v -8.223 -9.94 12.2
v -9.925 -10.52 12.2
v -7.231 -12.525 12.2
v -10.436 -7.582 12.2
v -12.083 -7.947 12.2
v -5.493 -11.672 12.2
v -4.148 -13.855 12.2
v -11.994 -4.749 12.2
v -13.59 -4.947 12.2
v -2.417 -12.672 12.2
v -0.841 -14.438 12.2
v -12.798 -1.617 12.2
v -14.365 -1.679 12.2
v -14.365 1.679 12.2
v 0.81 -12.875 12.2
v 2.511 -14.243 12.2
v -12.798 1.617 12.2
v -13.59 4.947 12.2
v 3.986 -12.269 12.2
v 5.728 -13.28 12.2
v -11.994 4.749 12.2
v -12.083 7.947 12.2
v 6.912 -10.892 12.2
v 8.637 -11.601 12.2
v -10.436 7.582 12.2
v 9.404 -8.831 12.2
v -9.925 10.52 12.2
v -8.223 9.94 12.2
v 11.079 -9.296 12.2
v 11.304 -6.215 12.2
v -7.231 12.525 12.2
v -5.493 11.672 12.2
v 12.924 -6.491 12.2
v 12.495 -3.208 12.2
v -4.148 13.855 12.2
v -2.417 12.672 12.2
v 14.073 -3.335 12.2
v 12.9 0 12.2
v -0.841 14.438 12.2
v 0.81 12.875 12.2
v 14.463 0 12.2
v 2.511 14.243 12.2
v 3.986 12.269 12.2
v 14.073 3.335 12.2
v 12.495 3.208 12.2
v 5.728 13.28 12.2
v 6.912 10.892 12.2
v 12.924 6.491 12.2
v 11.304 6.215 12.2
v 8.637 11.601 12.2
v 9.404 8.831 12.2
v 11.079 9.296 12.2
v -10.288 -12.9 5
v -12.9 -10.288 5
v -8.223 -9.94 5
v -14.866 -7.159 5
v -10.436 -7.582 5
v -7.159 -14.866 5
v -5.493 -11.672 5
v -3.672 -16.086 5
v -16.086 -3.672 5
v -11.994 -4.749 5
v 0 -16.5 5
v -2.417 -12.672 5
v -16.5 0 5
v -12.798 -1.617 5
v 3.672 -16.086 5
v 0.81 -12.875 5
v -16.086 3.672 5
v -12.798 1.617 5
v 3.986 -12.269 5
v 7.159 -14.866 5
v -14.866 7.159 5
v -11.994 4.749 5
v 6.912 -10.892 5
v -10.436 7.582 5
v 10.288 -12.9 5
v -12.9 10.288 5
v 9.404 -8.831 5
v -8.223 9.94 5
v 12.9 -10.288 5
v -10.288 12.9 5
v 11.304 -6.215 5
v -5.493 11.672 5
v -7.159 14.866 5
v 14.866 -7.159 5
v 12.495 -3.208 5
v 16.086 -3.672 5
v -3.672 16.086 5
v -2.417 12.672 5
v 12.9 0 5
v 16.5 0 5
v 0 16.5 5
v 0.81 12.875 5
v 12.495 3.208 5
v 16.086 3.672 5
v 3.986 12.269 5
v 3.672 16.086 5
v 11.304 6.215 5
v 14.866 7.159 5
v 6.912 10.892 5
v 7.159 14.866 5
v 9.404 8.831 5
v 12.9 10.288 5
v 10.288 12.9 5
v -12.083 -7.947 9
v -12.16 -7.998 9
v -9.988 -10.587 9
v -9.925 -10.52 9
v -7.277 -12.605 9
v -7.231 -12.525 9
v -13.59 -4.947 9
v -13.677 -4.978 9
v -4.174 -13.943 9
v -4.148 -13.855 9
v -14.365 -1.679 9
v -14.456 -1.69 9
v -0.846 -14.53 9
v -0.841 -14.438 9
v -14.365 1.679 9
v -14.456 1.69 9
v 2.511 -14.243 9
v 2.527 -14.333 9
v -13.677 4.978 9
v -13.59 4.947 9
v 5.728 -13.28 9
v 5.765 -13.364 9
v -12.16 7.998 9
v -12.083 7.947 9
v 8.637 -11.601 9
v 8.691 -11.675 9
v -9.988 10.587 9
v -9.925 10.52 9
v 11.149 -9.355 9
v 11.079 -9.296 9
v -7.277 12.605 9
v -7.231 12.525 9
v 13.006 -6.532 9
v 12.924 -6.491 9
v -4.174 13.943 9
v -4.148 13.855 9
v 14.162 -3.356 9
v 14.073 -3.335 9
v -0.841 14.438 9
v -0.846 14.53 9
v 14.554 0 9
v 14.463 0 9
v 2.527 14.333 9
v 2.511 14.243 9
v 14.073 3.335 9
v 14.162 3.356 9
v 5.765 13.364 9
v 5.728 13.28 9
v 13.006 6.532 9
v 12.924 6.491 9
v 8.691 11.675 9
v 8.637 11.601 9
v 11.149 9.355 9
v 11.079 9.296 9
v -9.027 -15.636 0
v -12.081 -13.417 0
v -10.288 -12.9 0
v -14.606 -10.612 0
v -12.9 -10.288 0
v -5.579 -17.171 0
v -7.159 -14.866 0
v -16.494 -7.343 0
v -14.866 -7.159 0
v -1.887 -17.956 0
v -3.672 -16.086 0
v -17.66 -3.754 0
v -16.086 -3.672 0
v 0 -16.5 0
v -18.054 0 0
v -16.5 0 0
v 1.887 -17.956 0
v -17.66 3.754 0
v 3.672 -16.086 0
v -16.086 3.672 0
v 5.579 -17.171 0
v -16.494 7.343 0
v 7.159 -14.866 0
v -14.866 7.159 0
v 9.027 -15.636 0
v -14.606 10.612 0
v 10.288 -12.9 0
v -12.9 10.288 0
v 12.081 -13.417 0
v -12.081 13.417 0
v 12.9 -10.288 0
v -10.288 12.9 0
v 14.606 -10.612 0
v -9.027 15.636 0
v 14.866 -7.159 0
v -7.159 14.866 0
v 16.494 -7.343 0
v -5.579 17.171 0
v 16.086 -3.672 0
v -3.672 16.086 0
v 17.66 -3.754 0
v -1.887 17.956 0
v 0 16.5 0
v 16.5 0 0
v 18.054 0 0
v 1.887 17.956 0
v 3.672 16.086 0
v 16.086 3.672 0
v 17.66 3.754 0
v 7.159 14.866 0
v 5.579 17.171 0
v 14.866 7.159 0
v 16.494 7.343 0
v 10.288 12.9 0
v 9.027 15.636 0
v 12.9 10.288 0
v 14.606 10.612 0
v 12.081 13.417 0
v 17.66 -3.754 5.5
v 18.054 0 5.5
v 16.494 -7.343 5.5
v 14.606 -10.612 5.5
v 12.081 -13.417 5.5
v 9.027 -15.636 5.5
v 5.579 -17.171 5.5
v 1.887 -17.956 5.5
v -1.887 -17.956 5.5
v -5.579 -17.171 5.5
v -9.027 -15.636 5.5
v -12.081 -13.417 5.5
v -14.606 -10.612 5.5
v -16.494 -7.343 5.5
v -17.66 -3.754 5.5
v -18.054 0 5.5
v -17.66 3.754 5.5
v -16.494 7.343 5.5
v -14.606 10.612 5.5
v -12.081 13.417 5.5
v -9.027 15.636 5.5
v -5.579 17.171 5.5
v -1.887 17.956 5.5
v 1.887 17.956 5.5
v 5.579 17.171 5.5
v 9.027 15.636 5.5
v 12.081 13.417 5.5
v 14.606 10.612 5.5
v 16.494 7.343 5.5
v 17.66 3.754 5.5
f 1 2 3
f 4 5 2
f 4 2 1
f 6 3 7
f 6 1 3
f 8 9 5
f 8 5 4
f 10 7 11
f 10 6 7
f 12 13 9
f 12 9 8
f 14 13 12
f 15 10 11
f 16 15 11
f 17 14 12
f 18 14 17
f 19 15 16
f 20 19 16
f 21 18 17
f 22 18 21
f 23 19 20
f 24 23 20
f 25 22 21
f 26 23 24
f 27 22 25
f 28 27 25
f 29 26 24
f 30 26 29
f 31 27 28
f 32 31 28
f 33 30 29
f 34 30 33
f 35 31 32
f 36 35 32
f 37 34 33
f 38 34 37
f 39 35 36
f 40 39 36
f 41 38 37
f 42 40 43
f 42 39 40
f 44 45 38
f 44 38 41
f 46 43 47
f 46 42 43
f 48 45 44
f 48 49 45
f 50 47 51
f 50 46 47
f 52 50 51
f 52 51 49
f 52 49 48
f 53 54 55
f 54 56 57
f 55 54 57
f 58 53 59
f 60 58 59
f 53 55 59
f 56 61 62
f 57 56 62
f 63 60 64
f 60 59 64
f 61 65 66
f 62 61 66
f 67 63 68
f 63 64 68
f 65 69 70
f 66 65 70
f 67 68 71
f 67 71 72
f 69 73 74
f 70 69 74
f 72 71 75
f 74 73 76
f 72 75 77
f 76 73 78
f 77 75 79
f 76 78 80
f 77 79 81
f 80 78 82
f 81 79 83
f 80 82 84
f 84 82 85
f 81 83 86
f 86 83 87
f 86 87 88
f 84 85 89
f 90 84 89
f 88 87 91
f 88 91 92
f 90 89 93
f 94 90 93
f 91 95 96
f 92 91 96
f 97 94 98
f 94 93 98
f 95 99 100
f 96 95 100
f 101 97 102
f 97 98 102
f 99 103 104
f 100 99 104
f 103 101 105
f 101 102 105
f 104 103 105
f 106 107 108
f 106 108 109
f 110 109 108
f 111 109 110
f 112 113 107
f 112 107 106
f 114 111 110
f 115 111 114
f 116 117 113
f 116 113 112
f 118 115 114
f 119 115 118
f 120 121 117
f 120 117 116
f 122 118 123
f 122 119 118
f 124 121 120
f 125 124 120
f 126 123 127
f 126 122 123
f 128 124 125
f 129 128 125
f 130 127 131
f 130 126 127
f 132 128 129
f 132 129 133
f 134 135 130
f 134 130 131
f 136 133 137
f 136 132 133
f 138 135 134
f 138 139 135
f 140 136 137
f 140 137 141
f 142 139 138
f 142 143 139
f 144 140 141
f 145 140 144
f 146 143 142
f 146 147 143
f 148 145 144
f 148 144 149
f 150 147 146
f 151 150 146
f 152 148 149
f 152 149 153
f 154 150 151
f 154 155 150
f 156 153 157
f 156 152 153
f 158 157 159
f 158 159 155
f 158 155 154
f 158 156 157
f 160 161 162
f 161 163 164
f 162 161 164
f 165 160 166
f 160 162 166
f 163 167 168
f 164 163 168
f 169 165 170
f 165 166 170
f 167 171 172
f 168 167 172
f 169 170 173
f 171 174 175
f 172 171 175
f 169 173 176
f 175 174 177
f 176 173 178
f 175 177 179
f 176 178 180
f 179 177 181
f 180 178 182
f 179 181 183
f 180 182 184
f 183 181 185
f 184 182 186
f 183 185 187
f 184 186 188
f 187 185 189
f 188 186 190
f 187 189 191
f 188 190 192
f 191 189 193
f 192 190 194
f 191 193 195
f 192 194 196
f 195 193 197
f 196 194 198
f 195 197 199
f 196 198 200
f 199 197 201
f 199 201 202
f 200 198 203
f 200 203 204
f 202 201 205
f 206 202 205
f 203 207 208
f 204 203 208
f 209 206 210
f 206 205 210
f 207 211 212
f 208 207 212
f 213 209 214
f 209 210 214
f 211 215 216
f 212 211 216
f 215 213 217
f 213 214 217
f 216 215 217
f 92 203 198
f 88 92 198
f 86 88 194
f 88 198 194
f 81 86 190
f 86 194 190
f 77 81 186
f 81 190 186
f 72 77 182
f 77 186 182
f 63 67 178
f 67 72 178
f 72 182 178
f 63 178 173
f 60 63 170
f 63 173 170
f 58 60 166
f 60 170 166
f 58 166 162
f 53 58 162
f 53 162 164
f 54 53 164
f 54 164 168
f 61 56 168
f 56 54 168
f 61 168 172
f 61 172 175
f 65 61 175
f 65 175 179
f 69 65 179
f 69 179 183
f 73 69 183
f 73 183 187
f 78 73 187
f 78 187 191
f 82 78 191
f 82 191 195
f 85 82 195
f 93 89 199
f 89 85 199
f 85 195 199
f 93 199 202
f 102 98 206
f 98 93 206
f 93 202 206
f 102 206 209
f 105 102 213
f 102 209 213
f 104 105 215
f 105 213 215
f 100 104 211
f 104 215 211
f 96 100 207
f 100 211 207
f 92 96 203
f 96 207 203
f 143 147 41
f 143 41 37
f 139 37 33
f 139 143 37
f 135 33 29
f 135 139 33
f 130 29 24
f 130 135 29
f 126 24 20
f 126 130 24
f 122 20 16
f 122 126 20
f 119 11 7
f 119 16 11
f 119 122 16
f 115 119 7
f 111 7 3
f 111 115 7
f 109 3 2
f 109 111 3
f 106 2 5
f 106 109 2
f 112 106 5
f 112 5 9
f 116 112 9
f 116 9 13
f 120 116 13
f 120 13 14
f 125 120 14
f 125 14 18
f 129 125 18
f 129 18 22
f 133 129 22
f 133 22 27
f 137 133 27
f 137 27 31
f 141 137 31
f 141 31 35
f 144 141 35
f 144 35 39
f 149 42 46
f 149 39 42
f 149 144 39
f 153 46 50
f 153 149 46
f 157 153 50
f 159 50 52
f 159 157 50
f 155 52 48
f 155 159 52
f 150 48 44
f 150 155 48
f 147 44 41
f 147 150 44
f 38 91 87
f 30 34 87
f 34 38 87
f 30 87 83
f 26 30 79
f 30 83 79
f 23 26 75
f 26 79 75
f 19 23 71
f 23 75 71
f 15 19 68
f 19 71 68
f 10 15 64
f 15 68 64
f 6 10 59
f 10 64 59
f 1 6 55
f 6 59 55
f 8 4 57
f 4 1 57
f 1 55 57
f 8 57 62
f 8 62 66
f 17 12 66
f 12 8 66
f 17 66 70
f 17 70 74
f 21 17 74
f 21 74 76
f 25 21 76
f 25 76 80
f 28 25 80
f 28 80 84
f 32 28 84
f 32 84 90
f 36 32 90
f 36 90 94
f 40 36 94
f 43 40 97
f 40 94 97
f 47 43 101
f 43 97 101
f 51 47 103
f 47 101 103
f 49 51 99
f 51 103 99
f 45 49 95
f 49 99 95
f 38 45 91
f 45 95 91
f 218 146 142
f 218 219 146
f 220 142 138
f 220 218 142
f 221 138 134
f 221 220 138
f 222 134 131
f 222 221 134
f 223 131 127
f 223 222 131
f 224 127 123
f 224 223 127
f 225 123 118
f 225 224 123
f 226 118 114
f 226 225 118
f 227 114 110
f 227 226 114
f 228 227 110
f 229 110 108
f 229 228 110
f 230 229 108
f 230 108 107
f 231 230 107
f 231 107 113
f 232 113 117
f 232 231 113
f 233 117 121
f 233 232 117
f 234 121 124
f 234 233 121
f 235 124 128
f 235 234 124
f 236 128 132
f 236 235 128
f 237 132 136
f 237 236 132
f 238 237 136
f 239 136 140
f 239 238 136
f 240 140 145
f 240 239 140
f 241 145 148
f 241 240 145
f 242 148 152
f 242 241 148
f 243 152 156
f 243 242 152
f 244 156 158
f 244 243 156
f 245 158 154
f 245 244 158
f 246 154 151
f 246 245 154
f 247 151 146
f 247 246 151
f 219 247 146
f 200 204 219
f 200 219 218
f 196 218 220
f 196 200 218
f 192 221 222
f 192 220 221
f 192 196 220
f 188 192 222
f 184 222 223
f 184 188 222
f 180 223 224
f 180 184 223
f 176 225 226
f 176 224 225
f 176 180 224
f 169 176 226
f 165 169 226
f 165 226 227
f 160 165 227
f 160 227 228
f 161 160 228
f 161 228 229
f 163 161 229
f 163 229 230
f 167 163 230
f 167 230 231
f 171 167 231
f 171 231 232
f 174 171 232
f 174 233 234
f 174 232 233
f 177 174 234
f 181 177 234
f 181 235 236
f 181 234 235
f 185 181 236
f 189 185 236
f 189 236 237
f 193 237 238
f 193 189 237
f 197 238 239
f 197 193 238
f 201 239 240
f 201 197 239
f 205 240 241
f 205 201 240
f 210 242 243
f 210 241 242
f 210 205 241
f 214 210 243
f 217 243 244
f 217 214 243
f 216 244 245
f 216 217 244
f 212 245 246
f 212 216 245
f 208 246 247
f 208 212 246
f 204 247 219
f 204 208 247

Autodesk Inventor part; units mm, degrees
ref_plane "YZ Plane" through (0, 0, 0) normal (1, 0, 0) x (0, 1, 0)
ref_plane "XZ Plane" through (0, 0, 0) normal (0, 1, 0) x (-1, 0, 0)
ref_plane "XY Plane" through (0, 0, 0) normal (0, 0, 1) x (1, 0, 0)
sketch "Sketch1" plane through (0, 0, 0) normal (0, 0, 1) x (1, 0, 0)
  circle A0 centre (0, 0) radius 16.5
  circle A1 centre (0, 0) radius 18.0545
  dimension "d0" = 33
  dimension "d1" = 1.5545
extrude "Extrusion1" add sketch "Sketch1" along normal blind 5
sketch "Sketch4" plane through (0, 0, 5) normal (0, 0, 1) x (1, 0, 0)
  circle A0 centre (0, 0) radius 12.9
  circle A1 centre (0, 0) radius 14.4627
  dimension "d4" = 25.8
  dimension "d5" = 1.5627
extrude "Extrusion2" add sketch "Sketch4" along normal blind 7.2
sketch "Sketch5" plane through (0, 0, 5) normal (0, 0, 1) x (1, 0, 0)
  circle A0 centre (0, 0) radius 18.0545
  circle A1 centre (0, 0) radius 14.2127
  circle A2 centre (0, 0) radius 18.0545 projected
extrude "Extrusion3" add sketch "Sketch5" along normal blind 4
chamfer "Chamfer2" distance 3.5 angle 45 1 edges at (-18.0545, 0, 9) measured on face at (16.5423, -2.594, 9)
properties part number "850_10_filter_holder_v2"
